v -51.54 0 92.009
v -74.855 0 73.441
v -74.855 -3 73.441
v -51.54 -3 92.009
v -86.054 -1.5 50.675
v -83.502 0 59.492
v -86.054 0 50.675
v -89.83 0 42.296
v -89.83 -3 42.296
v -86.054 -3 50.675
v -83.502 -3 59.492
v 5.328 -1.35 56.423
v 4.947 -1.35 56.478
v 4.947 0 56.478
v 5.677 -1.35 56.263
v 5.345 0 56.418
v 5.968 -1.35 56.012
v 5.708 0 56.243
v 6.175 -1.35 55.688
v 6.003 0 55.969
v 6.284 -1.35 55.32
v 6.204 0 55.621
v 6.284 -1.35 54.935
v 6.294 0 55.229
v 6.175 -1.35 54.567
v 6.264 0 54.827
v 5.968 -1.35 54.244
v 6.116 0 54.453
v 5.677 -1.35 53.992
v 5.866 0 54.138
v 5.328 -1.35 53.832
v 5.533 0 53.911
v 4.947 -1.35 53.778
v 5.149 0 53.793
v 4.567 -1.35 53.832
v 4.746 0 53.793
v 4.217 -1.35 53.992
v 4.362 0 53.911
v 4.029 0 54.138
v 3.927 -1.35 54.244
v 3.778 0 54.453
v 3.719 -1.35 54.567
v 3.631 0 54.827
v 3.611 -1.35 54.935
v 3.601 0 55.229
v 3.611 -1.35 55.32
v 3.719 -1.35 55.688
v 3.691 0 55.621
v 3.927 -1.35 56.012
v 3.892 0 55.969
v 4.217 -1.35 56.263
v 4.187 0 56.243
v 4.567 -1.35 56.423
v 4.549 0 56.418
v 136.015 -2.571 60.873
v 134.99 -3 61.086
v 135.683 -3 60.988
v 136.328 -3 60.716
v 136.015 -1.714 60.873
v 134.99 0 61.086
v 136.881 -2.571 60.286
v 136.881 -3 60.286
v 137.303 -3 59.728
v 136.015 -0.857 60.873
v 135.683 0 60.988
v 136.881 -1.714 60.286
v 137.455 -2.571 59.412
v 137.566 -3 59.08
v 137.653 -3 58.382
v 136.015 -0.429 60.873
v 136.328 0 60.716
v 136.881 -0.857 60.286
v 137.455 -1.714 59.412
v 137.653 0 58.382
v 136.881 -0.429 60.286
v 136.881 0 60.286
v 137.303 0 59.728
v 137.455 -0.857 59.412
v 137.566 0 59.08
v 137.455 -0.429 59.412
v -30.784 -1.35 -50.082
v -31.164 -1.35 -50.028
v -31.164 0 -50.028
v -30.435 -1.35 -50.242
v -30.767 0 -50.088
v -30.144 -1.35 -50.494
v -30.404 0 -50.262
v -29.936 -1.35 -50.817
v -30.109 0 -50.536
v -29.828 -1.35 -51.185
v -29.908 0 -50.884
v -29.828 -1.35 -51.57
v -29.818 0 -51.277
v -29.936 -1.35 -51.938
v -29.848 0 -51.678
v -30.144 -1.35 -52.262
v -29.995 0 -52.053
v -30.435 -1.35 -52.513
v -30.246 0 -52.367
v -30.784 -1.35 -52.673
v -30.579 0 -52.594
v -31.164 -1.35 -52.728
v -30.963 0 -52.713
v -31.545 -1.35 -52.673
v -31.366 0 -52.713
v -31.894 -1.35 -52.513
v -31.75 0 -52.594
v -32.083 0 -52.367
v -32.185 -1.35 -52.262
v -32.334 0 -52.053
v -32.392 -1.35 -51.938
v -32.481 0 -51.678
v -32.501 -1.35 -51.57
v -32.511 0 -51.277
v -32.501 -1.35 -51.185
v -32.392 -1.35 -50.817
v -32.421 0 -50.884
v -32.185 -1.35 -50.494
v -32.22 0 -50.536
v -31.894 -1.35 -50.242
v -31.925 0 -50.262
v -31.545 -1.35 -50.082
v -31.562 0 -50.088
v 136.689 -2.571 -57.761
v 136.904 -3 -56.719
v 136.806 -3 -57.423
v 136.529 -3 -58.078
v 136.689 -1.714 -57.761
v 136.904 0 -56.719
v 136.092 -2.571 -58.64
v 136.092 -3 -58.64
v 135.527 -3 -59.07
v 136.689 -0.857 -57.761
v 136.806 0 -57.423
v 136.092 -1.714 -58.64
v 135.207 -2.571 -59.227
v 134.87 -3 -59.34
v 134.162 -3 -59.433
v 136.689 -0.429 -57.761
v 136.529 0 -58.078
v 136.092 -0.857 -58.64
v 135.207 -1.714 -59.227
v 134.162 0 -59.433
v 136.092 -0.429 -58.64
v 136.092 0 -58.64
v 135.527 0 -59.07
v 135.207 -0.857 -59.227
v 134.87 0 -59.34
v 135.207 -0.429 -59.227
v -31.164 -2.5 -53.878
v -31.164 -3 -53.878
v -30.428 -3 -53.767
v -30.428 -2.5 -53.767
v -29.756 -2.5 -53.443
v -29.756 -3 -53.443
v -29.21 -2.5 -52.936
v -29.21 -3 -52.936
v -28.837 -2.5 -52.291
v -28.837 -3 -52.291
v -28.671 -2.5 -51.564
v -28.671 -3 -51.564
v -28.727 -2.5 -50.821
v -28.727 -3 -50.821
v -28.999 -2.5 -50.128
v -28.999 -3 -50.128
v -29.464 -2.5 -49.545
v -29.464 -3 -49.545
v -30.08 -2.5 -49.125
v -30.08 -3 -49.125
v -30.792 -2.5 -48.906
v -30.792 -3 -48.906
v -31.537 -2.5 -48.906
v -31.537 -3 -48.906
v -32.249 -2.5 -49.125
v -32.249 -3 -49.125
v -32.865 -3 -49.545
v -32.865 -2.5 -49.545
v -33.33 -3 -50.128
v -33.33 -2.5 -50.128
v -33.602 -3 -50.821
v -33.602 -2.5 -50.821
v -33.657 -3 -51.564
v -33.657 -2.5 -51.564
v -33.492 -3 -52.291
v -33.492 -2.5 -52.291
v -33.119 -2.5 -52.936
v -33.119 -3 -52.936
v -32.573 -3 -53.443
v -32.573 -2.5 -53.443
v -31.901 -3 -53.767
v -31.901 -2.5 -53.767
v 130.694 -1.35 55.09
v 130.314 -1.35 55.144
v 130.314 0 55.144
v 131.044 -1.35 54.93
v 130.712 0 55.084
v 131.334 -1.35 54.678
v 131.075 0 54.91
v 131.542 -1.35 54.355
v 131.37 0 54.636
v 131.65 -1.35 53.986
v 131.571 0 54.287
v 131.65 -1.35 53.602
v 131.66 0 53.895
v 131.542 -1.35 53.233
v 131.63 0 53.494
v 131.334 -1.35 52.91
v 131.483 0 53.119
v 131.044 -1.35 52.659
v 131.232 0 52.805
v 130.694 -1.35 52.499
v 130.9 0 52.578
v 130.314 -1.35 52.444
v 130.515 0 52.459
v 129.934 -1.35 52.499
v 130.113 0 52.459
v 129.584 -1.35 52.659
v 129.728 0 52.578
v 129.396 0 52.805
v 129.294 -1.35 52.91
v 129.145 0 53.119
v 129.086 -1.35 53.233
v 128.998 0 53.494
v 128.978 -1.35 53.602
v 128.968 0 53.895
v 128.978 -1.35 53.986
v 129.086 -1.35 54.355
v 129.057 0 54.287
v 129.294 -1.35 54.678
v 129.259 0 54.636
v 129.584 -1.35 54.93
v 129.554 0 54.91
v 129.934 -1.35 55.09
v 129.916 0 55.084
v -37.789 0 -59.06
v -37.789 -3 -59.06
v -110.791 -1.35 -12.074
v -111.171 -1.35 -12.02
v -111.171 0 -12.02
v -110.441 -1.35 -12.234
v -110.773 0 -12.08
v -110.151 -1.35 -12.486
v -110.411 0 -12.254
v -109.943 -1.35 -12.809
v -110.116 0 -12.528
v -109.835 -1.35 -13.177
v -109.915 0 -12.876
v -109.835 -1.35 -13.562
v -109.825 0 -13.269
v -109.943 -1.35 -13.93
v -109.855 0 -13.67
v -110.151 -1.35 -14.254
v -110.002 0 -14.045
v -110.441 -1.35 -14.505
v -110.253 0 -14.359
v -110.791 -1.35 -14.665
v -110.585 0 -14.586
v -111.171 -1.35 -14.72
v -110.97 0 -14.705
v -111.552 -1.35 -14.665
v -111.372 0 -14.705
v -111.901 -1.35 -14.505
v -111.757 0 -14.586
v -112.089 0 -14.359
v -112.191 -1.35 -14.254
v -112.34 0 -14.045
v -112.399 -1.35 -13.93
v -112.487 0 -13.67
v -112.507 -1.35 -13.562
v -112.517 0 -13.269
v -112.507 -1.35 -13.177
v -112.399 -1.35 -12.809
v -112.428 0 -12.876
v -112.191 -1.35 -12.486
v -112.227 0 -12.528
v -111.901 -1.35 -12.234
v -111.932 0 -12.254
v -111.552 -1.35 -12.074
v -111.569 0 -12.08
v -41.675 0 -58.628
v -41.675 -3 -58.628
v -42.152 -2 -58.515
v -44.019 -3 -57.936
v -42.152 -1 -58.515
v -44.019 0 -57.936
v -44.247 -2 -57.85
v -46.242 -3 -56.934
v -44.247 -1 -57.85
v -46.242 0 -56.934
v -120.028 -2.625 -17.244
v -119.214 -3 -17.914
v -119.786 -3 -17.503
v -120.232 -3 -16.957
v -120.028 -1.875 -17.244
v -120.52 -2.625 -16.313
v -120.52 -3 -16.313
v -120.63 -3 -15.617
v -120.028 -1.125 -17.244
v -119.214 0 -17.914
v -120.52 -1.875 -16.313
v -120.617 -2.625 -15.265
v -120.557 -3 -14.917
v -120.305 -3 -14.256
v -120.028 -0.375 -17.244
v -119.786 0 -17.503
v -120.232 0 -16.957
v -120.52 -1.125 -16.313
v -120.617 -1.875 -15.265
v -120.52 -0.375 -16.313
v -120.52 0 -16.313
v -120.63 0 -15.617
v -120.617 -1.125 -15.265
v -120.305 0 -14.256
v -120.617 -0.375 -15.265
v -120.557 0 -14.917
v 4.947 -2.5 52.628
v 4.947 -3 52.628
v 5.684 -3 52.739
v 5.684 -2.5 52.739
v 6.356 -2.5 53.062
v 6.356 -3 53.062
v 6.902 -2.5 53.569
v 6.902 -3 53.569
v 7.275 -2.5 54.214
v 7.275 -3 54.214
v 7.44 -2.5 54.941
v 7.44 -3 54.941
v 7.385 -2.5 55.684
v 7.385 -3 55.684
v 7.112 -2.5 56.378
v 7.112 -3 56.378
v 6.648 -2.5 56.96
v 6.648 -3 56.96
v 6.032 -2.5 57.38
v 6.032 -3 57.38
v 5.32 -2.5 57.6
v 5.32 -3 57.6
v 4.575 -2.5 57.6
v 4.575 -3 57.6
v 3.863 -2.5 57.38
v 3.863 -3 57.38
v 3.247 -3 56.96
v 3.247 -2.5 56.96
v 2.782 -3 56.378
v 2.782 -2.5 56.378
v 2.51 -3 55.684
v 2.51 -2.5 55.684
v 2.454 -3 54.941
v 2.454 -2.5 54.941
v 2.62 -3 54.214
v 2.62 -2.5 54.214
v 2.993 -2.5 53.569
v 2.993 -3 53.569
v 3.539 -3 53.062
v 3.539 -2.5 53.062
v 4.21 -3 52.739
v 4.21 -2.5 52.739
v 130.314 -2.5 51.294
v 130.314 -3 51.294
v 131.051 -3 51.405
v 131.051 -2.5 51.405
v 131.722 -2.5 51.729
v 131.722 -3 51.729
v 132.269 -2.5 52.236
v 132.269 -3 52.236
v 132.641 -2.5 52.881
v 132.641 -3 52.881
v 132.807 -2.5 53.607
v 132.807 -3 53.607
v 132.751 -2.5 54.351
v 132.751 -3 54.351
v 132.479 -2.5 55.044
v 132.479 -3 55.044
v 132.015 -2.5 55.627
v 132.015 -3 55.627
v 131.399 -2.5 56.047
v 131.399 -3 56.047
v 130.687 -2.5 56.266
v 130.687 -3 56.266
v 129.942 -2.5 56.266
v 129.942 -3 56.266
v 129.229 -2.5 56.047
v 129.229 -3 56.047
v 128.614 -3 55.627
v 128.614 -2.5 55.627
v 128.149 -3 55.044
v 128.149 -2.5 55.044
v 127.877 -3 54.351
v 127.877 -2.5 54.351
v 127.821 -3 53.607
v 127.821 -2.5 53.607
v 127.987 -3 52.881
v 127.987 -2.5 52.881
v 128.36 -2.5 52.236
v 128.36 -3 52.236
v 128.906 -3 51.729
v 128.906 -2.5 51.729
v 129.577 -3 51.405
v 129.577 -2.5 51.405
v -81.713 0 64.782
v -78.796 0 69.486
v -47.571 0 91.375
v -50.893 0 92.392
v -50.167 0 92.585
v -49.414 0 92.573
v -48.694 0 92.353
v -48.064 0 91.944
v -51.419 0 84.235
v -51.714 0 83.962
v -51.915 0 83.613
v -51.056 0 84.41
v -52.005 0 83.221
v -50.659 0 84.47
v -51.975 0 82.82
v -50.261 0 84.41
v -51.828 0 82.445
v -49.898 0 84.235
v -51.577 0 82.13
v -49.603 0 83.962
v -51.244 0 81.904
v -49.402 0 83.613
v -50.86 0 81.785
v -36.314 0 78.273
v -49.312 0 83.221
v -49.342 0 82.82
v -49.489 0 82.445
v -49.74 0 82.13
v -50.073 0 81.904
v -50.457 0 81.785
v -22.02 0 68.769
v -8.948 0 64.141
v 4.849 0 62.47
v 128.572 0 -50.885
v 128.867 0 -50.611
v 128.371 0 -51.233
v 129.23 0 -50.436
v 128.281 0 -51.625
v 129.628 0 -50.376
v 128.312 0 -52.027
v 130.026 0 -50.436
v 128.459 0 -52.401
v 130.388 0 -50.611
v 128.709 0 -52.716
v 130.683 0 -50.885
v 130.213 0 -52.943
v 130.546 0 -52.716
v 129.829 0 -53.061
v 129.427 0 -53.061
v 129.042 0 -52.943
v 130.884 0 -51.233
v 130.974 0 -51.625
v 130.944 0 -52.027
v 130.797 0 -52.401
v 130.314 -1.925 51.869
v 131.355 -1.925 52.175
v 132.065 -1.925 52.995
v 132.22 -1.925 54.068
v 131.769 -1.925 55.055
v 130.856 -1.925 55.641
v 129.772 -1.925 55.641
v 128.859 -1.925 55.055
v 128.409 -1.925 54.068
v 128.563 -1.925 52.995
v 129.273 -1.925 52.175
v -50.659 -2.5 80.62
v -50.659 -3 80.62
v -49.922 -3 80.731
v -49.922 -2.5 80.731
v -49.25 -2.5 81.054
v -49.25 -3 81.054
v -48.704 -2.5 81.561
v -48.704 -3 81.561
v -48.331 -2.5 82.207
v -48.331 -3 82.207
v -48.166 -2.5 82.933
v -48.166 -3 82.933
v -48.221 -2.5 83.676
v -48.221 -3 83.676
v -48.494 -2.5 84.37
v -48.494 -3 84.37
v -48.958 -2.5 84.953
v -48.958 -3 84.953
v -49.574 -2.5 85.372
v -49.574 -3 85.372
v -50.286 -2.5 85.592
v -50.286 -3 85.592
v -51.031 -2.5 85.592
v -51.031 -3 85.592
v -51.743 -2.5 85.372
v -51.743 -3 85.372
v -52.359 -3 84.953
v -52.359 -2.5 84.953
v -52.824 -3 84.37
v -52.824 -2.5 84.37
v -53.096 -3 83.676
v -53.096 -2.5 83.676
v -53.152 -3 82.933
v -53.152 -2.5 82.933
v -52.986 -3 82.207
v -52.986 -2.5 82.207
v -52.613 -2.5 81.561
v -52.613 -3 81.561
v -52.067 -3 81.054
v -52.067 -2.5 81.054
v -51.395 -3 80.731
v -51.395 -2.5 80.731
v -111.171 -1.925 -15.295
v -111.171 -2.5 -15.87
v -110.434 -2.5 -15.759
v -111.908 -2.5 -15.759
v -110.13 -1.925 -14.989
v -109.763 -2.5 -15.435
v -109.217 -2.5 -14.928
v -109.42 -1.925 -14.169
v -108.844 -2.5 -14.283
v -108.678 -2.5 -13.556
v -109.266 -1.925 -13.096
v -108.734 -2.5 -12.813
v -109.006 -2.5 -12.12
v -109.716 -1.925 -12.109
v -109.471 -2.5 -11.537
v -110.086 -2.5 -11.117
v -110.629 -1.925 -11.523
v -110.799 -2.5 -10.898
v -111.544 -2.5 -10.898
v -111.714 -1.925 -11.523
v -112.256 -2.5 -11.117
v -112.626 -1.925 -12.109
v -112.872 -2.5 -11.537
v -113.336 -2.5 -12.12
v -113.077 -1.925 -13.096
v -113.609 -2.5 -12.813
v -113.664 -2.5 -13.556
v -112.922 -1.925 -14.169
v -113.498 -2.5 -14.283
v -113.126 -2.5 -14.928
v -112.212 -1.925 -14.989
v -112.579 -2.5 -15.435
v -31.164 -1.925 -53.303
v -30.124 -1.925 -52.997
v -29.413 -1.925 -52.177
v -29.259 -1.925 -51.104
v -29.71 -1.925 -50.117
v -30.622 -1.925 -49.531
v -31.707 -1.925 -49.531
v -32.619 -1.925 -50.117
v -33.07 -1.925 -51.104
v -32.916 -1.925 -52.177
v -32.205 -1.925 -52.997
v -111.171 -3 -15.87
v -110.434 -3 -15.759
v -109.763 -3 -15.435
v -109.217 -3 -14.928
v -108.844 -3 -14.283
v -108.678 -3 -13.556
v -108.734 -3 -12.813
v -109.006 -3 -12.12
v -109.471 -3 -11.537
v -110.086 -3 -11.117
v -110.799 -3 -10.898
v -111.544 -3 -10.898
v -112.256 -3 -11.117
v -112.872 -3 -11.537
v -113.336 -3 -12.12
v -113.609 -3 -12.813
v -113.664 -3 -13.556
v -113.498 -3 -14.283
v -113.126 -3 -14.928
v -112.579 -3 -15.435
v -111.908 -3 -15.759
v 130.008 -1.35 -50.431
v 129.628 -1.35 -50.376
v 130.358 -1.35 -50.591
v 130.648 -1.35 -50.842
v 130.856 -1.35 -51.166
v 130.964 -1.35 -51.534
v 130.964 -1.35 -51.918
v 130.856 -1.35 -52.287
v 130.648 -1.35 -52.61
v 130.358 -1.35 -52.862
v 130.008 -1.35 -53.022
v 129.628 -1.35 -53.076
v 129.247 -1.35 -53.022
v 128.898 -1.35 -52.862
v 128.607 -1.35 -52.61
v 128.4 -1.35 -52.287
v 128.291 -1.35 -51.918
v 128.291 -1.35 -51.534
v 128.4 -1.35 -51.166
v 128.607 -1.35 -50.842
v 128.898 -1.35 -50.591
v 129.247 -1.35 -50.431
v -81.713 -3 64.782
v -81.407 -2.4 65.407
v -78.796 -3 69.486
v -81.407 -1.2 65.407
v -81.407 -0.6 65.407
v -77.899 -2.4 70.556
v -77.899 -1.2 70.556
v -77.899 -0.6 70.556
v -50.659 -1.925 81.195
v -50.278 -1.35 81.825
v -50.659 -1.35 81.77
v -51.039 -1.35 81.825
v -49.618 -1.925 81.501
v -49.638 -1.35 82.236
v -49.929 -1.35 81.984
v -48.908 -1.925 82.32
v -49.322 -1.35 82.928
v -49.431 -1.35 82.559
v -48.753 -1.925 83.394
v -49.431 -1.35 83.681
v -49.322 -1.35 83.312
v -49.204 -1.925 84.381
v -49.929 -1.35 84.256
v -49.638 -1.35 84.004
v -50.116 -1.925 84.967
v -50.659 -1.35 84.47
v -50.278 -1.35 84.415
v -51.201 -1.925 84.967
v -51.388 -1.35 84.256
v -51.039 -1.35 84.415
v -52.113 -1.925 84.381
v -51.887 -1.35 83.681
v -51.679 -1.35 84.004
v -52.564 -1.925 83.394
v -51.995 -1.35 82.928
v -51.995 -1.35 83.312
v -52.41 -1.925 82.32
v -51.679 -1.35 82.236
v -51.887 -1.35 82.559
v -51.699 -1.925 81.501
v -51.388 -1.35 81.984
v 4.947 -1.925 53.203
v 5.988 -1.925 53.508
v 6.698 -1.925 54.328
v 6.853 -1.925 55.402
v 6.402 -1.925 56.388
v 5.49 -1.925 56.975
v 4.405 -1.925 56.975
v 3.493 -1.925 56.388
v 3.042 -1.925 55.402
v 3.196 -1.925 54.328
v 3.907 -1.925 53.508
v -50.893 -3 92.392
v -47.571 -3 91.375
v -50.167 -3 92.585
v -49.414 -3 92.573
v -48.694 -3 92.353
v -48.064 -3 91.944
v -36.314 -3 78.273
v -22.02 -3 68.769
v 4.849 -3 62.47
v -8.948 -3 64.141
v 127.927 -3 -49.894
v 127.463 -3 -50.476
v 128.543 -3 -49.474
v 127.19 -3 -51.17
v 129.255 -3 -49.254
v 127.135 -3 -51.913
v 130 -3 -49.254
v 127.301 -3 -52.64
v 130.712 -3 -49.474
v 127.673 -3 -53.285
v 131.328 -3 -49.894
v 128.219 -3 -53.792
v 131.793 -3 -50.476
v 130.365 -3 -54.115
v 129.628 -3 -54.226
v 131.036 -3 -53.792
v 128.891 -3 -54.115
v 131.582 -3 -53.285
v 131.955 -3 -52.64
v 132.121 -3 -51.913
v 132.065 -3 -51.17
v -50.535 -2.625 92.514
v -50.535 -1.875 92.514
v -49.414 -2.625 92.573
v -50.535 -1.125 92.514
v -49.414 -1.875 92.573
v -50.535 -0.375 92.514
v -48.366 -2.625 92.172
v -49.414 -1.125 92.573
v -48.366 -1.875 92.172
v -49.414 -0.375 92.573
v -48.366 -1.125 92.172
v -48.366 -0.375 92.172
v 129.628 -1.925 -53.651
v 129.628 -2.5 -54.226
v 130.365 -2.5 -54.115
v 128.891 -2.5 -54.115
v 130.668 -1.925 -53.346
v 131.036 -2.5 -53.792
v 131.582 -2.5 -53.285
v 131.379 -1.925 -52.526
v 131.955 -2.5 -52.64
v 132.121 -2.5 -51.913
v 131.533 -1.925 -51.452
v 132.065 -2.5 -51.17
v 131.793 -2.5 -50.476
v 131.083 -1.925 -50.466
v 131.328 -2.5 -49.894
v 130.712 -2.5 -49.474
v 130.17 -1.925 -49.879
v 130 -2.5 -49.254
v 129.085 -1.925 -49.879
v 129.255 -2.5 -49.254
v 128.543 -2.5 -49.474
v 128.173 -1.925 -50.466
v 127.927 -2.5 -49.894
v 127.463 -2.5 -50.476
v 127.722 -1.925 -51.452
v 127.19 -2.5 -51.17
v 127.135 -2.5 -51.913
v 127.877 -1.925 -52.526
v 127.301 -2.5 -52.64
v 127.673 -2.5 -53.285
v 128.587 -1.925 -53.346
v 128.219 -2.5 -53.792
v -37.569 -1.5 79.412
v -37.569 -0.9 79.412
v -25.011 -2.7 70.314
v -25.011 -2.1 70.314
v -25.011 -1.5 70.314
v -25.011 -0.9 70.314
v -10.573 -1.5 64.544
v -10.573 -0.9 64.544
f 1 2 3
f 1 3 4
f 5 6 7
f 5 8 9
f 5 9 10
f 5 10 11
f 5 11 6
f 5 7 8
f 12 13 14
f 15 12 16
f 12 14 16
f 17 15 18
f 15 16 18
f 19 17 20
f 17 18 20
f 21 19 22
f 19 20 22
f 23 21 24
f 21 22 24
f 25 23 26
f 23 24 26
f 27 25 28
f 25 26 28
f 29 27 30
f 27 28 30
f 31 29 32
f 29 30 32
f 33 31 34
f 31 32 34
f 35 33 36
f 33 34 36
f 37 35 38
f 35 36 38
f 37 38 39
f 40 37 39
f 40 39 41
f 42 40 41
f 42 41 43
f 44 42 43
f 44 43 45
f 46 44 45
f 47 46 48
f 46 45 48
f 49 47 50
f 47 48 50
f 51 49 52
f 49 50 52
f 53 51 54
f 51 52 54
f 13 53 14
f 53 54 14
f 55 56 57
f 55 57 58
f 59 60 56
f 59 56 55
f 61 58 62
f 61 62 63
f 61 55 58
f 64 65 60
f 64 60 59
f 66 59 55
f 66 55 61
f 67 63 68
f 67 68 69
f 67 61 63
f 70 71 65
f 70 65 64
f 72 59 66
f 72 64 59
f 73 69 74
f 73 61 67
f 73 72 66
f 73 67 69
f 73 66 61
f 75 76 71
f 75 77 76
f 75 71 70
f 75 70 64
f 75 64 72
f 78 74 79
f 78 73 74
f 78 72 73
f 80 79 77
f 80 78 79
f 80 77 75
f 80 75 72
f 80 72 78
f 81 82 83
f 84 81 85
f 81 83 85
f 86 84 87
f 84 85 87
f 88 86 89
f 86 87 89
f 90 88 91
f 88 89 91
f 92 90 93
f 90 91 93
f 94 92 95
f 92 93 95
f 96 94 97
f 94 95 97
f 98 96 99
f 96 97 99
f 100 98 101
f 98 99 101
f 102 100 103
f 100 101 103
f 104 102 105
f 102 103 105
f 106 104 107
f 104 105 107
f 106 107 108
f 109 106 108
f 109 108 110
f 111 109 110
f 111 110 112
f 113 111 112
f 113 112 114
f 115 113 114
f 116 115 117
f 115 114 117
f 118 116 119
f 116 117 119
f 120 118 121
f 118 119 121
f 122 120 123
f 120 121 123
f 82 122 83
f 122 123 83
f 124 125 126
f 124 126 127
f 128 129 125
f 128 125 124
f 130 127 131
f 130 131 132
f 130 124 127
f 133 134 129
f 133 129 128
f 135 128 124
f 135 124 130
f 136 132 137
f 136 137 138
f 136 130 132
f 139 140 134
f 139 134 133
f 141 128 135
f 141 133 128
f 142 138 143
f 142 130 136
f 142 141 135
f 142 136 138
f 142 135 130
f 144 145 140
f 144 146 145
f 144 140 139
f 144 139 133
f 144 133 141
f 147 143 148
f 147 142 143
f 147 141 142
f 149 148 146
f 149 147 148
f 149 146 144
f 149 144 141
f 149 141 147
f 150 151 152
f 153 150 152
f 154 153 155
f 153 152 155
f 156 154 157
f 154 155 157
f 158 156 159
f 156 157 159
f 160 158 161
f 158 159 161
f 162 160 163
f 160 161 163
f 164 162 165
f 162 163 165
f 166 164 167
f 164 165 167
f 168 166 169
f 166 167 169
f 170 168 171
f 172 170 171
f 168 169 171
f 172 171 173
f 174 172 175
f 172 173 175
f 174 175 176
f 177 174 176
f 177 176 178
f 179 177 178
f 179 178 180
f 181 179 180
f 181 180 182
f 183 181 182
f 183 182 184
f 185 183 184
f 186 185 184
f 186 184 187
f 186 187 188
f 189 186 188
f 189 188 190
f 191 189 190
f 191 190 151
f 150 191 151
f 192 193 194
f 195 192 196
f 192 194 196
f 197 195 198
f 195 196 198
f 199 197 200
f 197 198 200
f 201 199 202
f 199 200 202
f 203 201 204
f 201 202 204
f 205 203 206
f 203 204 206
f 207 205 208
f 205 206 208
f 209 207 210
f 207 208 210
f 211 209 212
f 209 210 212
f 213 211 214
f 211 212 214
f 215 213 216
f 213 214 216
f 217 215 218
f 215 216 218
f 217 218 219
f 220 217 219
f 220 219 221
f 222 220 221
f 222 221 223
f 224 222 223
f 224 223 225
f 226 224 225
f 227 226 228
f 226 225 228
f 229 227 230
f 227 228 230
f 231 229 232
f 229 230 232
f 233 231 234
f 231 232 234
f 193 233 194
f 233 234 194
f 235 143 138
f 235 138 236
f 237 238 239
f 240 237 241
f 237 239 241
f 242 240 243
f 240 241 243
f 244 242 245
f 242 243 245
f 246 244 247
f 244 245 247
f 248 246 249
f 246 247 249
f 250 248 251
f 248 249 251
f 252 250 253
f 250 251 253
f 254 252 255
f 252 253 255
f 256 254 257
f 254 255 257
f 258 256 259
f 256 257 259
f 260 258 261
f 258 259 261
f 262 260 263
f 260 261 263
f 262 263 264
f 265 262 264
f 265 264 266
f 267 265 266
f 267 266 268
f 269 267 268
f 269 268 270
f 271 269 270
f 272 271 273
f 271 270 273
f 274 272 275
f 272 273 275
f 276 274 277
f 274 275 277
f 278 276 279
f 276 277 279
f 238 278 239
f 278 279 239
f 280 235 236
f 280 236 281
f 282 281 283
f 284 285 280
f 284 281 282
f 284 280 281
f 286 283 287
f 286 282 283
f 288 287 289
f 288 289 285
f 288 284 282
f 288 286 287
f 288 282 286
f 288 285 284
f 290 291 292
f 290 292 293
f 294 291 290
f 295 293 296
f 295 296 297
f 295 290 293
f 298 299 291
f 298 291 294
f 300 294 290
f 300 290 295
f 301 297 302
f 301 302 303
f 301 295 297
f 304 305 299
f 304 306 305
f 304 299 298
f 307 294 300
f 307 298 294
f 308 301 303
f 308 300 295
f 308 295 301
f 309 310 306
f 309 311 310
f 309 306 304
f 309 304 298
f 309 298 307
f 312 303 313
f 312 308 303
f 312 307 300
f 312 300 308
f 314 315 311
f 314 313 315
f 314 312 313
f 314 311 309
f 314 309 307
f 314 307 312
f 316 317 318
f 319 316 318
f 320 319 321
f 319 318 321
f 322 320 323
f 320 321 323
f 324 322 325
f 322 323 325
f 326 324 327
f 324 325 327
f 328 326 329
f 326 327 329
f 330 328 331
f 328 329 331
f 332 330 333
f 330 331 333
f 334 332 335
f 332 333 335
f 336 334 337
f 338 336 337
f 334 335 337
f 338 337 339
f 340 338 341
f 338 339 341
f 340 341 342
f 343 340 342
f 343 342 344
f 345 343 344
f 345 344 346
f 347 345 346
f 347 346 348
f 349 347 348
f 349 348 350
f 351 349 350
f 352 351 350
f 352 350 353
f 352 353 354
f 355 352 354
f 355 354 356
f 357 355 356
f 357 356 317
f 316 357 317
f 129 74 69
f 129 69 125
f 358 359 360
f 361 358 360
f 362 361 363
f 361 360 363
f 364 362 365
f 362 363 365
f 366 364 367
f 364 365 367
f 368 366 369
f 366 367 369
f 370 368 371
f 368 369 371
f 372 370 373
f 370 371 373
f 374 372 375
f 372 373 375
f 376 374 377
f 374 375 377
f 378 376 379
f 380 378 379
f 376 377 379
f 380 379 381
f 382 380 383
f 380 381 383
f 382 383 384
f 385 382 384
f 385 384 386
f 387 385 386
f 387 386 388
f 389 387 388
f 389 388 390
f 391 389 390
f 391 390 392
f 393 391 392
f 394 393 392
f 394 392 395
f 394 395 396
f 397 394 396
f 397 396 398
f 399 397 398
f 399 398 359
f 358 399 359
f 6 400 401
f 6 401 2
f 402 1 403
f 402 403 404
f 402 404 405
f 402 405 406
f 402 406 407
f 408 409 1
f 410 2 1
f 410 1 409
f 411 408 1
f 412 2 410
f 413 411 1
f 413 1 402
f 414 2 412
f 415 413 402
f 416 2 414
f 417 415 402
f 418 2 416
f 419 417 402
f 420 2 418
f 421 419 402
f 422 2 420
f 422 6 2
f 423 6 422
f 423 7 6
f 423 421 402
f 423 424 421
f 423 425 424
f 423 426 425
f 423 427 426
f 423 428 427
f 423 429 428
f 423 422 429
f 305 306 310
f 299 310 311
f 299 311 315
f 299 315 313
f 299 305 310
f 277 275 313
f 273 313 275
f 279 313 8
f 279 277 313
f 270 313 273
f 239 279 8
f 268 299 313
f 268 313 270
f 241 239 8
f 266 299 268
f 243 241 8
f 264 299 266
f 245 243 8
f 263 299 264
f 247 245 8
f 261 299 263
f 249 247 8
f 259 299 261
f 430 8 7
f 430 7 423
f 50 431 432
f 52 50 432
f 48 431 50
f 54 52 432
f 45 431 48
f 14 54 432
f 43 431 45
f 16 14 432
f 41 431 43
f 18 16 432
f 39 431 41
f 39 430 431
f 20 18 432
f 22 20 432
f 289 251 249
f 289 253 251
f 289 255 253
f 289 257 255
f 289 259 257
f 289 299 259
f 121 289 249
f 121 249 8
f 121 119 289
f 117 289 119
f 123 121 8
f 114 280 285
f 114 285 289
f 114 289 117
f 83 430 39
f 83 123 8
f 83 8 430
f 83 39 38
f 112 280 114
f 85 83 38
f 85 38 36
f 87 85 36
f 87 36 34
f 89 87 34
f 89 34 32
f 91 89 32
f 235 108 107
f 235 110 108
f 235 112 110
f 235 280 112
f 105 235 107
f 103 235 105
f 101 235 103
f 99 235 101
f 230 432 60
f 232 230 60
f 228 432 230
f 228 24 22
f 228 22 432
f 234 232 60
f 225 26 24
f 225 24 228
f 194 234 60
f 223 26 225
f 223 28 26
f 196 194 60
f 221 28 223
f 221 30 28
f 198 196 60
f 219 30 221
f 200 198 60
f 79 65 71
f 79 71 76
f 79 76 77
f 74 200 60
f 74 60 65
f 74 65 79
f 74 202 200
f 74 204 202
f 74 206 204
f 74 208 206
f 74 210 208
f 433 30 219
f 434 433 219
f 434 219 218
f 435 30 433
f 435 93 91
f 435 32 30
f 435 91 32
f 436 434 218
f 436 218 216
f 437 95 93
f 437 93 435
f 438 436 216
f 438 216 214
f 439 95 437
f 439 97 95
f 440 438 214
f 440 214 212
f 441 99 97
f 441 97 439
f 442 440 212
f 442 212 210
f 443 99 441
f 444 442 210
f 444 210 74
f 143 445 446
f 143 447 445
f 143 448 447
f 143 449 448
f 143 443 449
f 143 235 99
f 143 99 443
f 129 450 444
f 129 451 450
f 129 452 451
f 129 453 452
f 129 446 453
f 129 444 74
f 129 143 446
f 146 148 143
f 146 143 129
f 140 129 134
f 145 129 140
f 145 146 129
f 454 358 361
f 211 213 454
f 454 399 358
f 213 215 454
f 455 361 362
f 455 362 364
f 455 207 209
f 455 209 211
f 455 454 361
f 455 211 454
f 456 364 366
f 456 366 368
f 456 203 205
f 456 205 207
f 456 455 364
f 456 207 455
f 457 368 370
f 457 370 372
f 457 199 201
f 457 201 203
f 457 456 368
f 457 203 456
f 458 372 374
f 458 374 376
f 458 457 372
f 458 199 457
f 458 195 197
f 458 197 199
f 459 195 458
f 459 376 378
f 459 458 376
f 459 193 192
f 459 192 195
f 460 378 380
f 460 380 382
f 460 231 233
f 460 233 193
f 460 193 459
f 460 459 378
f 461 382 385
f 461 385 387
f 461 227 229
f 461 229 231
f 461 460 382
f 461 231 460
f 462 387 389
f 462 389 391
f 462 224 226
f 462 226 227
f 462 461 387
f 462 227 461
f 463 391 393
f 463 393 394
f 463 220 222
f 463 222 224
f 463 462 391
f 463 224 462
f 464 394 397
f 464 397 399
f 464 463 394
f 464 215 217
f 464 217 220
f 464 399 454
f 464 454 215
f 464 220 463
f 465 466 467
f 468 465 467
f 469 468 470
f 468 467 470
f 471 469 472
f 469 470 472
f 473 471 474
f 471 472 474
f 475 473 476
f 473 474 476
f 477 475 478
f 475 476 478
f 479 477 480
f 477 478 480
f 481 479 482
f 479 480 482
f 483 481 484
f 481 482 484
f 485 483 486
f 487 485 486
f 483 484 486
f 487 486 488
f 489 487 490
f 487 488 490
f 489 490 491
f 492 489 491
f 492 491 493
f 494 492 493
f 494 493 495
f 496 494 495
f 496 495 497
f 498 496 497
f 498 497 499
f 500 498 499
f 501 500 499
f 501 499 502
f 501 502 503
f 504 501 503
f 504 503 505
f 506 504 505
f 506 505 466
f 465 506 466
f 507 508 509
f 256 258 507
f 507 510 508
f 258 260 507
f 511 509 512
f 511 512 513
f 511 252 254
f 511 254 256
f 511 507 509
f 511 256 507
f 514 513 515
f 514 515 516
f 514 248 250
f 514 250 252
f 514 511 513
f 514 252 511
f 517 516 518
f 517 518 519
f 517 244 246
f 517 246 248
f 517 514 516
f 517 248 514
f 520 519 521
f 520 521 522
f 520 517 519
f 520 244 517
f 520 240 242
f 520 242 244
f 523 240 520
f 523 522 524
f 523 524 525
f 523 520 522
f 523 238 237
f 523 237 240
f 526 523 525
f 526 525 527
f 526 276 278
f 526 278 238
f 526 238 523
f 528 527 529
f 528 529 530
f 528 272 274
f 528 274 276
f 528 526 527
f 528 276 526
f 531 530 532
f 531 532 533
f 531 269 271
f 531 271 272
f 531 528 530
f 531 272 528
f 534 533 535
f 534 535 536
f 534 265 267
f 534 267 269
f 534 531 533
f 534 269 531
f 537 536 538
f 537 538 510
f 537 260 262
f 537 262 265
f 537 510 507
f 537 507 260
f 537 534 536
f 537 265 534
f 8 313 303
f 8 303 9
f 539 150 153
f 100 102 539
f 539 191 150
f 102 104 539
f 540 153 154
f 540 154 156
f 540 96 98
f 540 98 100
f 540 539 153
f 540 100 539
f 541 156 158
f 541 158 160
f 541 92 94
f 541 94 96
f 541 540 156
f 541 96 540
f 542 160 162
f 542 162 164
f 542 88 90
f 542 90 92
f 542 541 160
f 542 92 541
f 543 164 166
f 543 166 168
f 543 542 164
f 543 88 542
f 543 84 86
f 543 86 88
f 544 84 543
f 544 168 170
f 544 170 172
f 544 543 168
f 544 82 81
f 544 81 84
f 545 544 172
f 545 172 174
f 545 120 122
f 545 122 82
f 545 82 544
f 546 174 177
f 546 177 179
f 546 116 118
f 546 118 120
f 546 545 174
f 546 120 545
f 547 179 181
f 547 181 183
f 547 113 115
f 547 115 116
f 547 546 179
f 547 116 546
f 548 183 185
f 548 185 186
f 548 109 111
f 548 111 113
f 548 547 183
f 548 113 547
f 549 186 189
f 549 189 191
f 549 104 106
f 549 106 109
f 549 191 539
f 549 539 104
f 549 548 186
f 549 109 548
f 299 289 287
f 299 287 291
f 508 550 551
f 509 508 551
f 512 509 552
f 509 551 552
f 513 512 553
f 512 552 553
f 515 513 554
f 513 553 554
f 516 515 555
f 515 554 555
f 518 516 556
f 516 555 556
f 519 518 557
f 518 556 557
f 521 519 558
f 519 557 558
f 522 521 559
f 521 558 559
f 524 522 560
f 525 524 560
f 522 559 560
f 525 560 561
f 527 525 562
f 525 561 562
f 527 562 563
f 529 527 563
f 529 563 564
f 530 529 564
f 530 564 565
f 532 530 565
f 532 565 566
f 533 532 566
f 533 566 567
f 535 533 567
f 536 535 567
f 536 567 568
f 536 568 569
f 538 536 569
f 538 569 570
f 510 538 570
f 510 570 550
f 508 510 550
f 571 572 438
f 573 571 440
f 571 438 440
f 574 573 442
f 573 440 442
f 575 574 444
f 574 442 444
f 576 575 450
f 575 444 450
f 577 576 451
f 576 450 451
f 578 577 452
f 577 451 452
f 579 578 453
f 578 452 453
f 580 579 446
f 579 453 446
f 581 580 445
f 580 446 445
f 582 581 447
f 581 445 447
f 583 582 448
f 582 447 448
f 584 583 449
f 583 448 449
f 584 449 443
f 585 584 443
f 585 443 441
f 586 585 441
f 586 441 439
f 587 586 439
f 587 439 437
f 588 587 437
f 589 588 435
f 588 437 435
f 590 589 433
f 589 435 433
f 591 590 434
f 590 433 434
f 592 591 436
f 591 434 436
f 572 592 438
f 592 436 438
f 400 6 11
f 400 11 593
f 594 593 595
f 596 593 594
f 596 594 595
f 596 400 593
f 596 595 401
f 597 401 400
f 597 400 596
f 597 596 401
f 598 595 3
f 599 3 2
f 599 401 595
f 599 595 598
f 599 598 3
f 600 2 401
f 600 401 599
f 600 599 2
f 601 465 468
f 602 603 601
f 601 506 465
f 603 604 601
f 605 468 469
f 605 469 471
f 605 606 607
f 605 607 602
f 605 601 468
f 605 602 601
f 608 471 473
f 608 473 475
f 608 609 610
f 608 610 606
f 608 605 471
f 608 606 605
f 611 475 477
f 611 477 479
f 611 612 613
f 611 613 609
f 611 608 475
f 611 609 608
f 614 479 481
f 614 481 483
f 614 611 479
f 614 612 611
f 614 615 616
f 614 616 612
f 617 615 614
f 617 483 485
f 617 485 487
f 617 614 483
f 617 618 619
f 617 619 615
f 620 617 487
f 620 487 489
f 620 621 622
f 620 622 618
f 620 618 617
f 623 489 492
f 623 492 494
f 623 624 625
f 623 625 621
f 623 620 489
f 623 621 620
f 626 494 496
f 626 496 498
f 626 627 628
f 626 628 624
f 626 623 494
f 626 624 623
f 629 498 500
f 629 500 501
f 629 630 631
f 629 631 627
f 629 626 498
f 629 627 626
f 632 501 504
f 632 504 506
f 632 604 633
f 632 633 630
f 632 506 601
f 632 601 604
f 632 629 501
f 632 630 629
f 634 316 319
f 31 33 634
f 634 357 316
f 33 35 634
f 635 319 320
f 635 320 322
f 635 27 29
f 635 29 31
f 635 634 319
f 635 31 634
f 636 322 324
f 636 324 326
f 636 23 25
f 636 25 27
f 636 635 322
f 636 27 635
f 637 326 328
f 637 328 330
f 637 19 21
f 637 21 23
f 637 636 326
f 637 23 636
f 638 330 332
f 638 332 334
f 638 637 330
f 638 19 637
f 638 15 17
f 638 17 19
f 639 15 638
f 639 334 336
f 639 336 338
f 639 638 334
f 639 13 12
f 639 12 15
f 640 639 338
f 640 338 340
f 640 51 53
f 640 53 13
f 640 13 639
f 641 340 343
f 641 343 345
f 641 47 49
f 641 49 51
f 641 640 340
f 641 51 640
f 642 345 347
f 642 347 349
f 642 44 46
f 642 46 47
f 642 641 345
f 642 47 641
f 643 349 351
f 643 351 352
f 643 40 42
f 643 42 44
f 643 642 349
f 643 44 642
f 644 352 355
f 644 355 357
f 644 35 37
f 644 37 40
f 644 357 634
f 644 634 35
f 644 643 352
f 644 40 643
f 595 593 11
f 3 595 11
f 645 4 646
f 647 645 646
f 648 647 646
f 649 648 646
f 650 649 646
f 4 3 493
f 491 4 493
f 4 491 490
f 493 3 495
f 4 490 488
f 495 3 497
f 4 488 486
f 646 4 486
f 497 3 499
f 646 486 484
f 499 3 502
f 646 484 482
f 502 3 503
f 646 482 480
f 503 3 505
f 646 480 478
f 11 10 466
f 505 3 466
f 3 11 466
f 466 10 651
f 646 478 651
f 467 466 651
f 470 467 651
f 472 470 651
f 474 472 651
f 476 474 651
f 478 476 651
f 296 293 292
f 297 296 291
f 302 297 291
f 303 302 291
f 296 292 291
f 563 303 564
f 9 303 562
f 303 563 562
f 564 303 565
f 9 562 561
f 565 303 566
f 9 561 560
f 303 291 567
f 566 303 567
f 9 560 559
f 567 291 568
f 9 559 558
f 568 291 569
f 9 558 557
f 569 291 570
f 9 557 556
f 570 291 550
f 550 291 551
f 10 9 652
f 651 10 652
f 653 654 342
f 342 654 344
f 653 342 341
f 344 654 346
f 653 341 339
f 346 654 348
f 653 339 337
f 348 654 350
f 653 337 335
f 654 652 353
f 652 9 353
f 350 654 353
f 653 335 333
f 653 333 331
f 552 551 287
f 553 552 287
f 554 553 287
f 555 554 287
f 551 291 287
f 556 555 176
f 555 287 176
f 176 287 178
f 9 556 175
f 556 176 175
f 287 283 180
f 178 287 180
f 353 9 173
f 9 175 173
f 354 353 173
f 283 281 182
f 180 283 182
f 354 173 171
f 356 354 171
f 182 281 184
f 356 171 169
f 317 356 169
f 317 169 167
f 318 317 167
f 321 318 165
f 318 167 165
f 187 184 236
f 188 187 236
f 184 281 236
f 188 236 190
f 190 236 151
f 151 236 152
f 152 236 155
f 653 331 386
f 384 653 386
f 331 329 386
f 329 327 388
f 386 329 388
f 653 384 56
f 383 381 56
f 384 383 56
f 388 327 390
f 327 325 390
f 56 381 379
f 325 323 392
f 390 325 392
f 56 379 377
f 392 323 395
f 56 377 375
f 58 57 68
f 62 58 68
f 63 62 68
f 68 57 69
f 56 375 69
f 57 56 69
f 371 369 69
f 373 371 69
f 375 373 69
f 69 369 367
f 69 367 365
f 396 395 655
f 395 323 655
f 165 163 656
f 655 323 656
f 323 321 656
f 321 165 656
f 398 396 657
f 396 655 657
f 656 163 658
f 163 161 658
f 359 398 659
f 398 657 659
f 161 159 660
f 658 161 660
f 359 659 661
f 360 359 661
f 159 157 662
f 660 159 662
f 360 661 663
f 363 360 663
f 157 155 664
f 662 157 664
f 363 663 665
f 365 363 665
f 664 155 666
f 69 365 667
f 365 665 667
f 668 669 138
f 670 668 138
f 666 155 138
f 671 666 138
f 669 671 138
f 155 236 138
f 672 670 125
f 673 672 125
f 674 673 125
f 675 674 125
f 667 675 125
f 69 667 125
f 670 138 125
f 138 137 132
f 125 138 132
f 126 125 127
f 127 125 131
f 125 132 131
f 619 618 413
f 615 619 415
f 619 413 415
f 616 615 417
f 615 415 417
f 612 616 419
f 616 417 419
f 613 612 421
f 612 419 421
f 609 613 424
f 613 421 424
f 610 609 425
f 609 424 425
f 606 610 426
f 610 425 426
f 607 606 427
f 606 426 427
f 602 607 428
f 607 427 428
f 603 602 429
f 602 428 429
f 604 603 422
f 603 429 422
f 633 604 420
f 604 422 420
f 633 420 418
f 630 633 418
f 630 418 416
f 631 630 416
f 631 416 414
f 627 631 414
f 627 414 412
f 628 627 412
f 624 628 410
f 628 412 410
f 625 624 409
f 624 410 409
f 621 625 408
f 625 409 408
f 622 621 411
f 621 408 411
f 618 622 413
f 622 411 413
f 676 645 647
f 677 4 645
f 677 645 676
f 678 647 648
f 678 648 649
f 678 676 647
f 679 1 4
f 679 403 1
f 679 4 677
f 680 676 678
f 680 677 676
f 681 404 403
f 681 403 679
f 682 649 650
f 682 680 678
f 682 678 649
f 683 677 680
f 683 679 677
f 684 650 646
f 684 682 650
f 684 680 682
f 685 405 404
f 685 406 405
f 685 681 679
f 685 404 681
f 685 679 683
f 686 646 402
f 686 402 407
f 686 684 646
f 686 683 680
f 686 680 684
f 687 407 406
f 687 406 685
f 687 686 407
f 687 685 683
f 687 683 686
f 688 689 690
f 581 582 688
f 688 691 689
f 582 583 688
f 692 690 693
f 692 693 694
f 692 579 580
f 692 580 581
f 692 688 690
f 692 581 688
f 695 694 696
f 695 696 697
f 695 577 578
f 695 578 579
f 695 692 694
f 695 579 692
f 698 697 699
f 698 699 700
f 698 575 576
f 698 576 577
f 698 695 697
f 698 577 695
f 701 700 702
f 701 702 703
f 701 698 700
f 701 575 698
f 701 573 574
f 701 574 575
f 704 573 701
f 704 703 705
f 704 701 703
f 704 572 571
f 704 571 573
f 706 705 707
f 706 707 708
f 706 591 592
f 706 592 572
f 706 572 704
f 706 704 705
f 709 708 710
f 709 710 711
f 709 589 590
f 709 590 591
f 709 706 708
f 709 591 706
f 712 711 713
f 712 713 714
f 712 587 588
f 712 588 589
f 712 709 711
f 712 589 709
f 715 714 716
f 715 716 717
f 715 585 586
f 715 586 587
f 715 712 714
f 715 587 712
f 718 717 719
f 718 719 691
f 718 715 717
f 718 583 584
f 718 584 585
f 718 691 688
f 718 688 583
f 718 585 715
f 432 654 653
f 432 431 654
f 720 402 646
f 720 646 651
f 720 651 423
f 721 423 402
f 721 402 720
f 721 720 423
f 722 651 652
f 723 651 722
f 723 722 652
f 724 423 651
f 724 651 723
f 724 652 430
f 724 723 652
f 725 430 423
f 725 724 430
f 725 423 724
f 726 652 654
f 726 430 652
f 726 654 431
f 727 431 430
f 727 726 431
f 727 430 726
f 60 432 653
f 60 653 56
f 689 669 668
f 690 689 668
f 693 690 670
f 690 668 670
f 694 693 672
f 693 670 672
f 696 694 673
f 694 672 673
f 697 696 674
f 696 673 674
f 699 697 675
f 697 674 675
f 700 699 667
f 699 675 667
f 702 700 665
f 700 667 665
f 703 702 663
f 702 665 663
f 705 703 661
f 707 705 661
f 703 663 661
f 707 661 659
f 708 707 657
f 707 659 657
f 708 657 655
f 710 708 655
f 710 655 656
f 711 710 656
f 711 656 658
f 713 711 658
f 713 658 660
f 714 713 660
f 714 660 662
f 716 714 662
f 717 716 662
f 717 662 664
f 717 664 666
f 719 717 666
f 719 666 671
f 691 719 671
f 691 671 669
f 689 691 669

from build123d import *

# Parameters (mm, degrees)
SKETCH1_R           = 1.35
BOSS_EXTRUDE1_DEPTH = 3
SKETCH2_R           = 2.5
CUT_EXTRUDE1_DEPTH  = 1.7
CHAMFER1_SIZE       = 1.2


with BuildPart() as part:
    # Sketch1 → Boss-Extrude1 (new body)
    with BuildSketch(Plane(origin=(0, 0, 0), x_dir=(1, 0, 0), z_dir=(0, 1, 0))):
        with BuildLine():
            Line((134.161534911, 59.43281878), (-37.78892646, 59.059864213))
            add(Edge.make_bspline(
                [(-37.78892646, 59.059864213), (-39.260373987, 59.056672695), (-40.726264192, 58.873631016), (-42.864744181, 58.335544499), (-43.56477321, 58.113464931), (-44.928422176, 57.586554564), (-45.593707509, 57.281316649), (-46.242490458, 56.934388883)],
                knots=[0, 0, 0, 0, 0.5, 0.5, 0.75, 0.75, 1, 1, 1, 1], degree=3))
            Line((-46.242490458, 56.934388883), (-119.214433491, 17.913645156))
            add(Edge.make_bspline(
                [(-119.214433491, 17.913645156), (-119.371714153, 17.829541484), (-119.518068848, 17.731347507), (-119.789747392, 17.507837833), (-119.916274323, 17.380912308), (-120.139852202, 17.106706149), (-120.236961752, 16.960118582), (-120.402064762, 16.648131274), (-120.469932783, 16.481746722), (-120.570167022, 16.144162456), (-120.603591555, 15.971345529), (-120.63629684, 15.61747918), (-120.635015098, 15.439777034), (-120.598507798, 15.090011023), (-120.562994402, 14.91558609), (-120.458204018, 14.575953541), (-120.389758062, 14.412551149), (-120.305177563, 14.255596117)],
                knots=[0, 0, 0, 0, 0.125, 0.125, 0.25, 0.25, 0.375, 0.375, 0.5, 0.5, 0.625, 0.625, 0.75, 0.75, 0.875, 0.875, 1, 1, 1, 1], degree=3))
            Line((-120.305177563, 14.255596117), (-89.830246023, -42.296373733))
            add(Edge.make_bspline(
                [(-89.830246023, -42.296373733), (-88.375146858, -44.996584036), (-87.11307972, -47.796479497), (-84.994631409, -53.553509169), (-84.143686828, -56.492865486), (-83.501659246, -59.49224952)],
                knots=[0, 0, 0, 0, 0.5, 0.5, 1, 1, 1, 1], degree=3))
            add(Edge.make_bspline(
                [(-83.501659246, -59.49224952), (-83.207913745, -60.86455126), (-82.798283173, -62.200751268), (-82.010871212, -64.151167066), (-81.721235964, -64.787858992), (-81.092273153, -66.026650793), (-80.072714097, -67.836944856), (-78.830441112, -69.507100935), (-76.968111095, -71.604375976), (-75.952258591, -72.567256281), (-74.854523467, -73.441463587)],
                knots=[0, 0, 0, 0, 0.25, 0.25, 0.375, 0.375, 0.5, 0.75, 0.75, 1, 1, 1, 1], degree=3))
            Line((-74.854523467, -73.441463587), (-51.539950225, -92.008574916))
            add(Edge.make_bspline(
                [(-51.539950225, -92.008574916), (-51.390987712, -92.127204734), (-51.232429983, -92.228435853), (-50.896866499, -92.397446873), (-50.717603486, -92.465650862), (-50.353220614, -92.562423021), (-50.167823032, -92.591707222), (-49.790547653, -92.611667192), (-49.599550596, -92.601753163), (-49.228628709, -92.543472736), (-49.045331803, -92.494850179), (-48.690867071, -92.359239211), (-48.52347813, -92.273968718), (-48.207935535, -92.069298914), (-48.058689904, -91.948371285), (-47.792751324, -91.681532762), (-47.674455998, -91.534984666), (-47.571321486, -91.374872149)],
                knots=[0, 0, 0, 0, 0.125, 0.125, 0.25, 0.25, 0.375, 0.375, 0.5, 0.5, 0.625, 0.625, 0.75, 0.75, 0.875, 0.875, 1, 1, 1, 1], degree=3))
            add(Edge.make_bspline(
                [(-47.571321486, -91.374872149), (-46.153036919, -89.173037798), (-44.608917961, -87.076393648), (-41.274741201, -83.088695854), (-39.484564632, -81.197538353), (-35.653029438, -77.626010441), (-33.646571022, -75.978127616), (-29.459465947, -72.9471878), (-27.278793496, -71.564170023), (-23.876425351, -69.689354772), (-22.720413119, -69.097695924), (-20.363479447, -67.982655618), (-19.159804228, -67.458437514), (-15.529771039, -66.009292146), (-10.611085077, -64.391548948), (-5.539520445, -63.385094495), (-1.677546074, -62.863371081), (-0.379428844, -62.728223796), (2.232268288, -62.538422964), (3.539898616, -62.484137167), (4.849299501, -62.470210553)],
                knots=[0, 0, 0, 0, 0.125, 0.125, 0.25, 0.25, 0.375, 0.375, 0.5, 0.5, 0.5625, 0.5625, 0.625, 0.625, 0.75, 0.875, 0.875, 0.9375, 0.9375, 1, 1, 1, 1], degree=3))
            Line((4.849299501, -62.470210553), (134.990197336, -61.08604937))
            add(Edge.make_bspline(
                [(134.990197336, -61.08604937), (135.167346788, -61.084165224), (135.341361144, -61.064937541), (135.683502878, -60.993915065), (135.853395352, -60.941308848), (136.17721181, -60.80435926), (136.330630434, -60.720947254), (136.620639449, -60.524514457), (136.757918371, -60.410322016), (137.003647924, -60.161160095), (137.113655434, -60.025415528), (137.307455362, -59.731164559), (137.38973844, -59.574273341), (137.586799708, -59.088862557), (137.655136112, -58.736369262), (137.652832045, -58.382163441)],
                knots=[0, 0, 0, 0, 0.125, 0.125, 0.25, 0.25, 0.375, 0.375, 0.5, 0.5, 0.625, 0.625, 0.75, 0.75, 1, 1, 1, 1], degree=3))
            Line((137.652832045, -58.382163441), (136.904111112, 56.7188799))
            add(Edge.make_bspline(
                [(136.904111112, 56.7188799), (136.902940109, 56.898896811), (136.883766744, 57.075714075), (136.811945539, 57.42339902), (136.758448028, 57.596083274), (136.619240417, 57.924944469), (136.534418559, 58.080811621), (136.334727886, 58.375638017), (136.21883457, 58.51509664), (135.966139935, 58.765058133), (135.828467671, 58.877195989), (135.529967832, 59.07521276), (135.371179474, 59.159347789), (134.879114282, 59.361936915), (134.521405548, 59.433599309), (134.161534911, 59.43281878)],
                knots=[0, 0, 0, 0, 0.125, 0.125, 0.25, 0.25, 0.375, 0.375, 0.5, 0.5, 0.625, 0.625, 0.75, 0.75, 1, 1, 1, 1], degree=3))
        make_face()
        with Locations(Location((129.627717634, 51.726368816, 0), (0, 0, 270))):
            Circle(SKETCH1_R, mode=Mode.SUBTRACT)
        with Locations(Location((-31.164469896, 51.377616083, 0), (0, 0, 270))):
            Circle(SKETCH1_R, mode=Mode.SUBTRACT)
        with Locations(Location((-111.171184663, 13.369593003, 0), (0, 0, 270))):
            Circle(SKETCH1_R, mode=Mode.SUBTRACT)
        with Locations(Location((-50.65856493, -83.119927605, 0), (0, 0, 270))):
            Circle(SKETCH1_R, mode=Mode.SUBTRACT)
        with Locations(Location((4.947352904, -55.127624349, 0), (0, 0, 270))):
            Circle(SKETCH1_R, mode=Mode.SUBTRACT)
        with Locations(Location((130.314118933, -53.794240193, 0), (0, 0, 270))):
            Circle(SKETCH1_R, mode=Mode.SUBTRACT)
    extrude(amount=-BOSS_EXTRUDE1_DEPTH)

    # Sketch2 → Cut-Extrude1 (cut)
    with BuildSketch(Plane.XZ.offset(3)):
        with Locations(Location((-50.65856493, 83.119927605, 0), (0, 0, 270))):
            Circle(SKETCH2_R)
        with Locations(Location((4.947352904, 55.127624349, 0), (0, 0, 270))):
            Circle(SKETCH2_R)
        with Locations(Location((130.314118933, 53.794240193, 0), (0, 0, 270))):
            Circle(SKETCH2_R)
        with Locations(Location((129.627717634, -51.726368816, 0), (0, 0, 270))):
            Circle(SKETCH2_R)
        with Locations(Location((-31.164469896, -51.377616083, 0), (0, 0, 270))):
            Circle(SKETCH2_R)
        with Locations(Location((-111.171184663, -13.369593003, 0), (0, 0, 270))):
            Circle(SKETCH2_R)
    extrude(amount=-CUT_EXTRUDE1_DEPTH, mode=Mode.SUBTRACT)

    # Chamfer1
    # the kernel refuses this chamfer: 1.2 mm, written as the material it adds along each edge
    with BuildSketch(Plane(origin=(129.627717634, -1.3, -51.726368816), x_dir=(0, 0, -1), z_dir=(-1, 0, 0))) as chamfer1_piece_1_section:
        Polygon((2.5, CHAMFER1_SIZE), (2.5 - CHAMFER1_SIZE, 0), (2.5, 0), align=None)
    chamfer1_piece_1 = revolve(axis=Axis((129.627717634, -1.3, -51.726368816), (0, -1, 0)), mode=Mode.PRIVATE)
    chamfer1_piece_1 = chamfer1_piece_1 - Plane(origin=(129.627717634, -1.926520071, -51.726368816), x_dir=(0, 0, 1), z_dir=(0, 1, 0)) * Cylinder(1.35, 10, mode=Mode.PRIVATE)
    add(chamfer1_piece_1)
    with BuildSketch(Plane(origin=(130.314118933, -1.3, 53.794240193), x_dir=(0, 0, -1), z_dir=(-1, 0, 0))) as chamfer1_piece_2_section:
        Polygon((2.5, CHAMFER1_SIZE), (2.5 - CHAMFER1_SIZE, 0), (2.5, 0), align=None)
    chamfer1_piece_2 = revolve(axis=Axis((130.314118933, -1.3, 53.794240193), (0, -1, 0)), mode=Mode.PRIVATE)
    chamfer1_piece_2 = chamfer1_piece_2 - Plane(origin=(130.314118933, -1.926520071, 53.794240193), x_dir=(0, 0, 1), z_dir=(0, 1, 0)) * Cylinder(1.35, 10, mode=Mode.PRIVATE)
    add(chamfer1_piece_2)
    with BuildSketch(Plane(origin=(4.947352904, -1.3, 55.127624349), x_dir=(0, 0, -1), z_dir=(-1, 0, 0))) as chamfer1_piece_3_section:
        Polygon((2.5, CHAMFER1_SIZE), (2.5 - CHAMFER1_SIZE, 0), (2.5, 0), align=None)
    chamfer1_piece_3 = revolve(axis=Axis((4.947352904, -1.3, 55.127624349), (0, -1, 0)), mode=Mode.PRIVATE)
    chamfer1_piece_3 = chamfer1_piece_3 - Plane(origin=(4.947352904, -1.926520071, 55.127624349), x_dir=(0, 0, 1), z_dir=(0, 1, 0)) * Cylinder(1.35, 11, mode=Mode.PRIVATE)
    add(chamfer1_piece_3)
    with BuildSketch(Plane(origin=(-50.65856493, -1.3, 83.119927605), x_dir=(0, 0, -1), z_dir=(-1, 0, 0))) as chamfer1_piece_4_section:
        Polygon((2.5, CHAMFER1_SIZE), (2.5 - CHAMFER1_SIZE, 0), (2.5, 0), align=None)
    chamfer1_piece_4 = revolve(axis=Axis((-50.65856493, -1.3, 83.119927605), (0, -1, 0)), mode=Mode.PRIVATE)
    chamfer1_piece_4 = chamfer1_piece_4 - Plane(origin=(-50.65856493, -1.926520071, 83.119927605), x_dir=(0, 0, 1), z_dir=(0, 1, 0)) * Cylinder(1.35, 10, mode=Mode.PRIVATE)
    add(chamfer1_piece_4)
    with BuildSketch(Plane(origin=(-111.171184663, -1.3, -13.369593003), x_dir=(0, 0, -1), z_dir=(-1, 0, 0))) as chamfer1_piece_5_section:
        Polygon((2.5, CHAMFER1_SIZE), (2.5 - CHAMFER1_SIZE, 0), (2.5, 0), align=None)
    chamfer1_piece_5 = revolve(axis=Axis((-111.171184663, -1.3, -13.369593003), (0, -1, 0)), mode=Mode.PRIVATE)
    chamfer1_piece_5 = chamfer1_piece_5 - Plane(origin=(-111.171184663, -1.926520071, -13.369593003), x_dir=(0, 0, 1), z_dir=(0, 1, 0)) * Cylinder(1.35, 10, mode=Mode.PRIVATE)
    add(chamfer1_piece_5)
    with BuildSketch(Plane(origin=(-31.164469896, -1.3, -51.377616083), x_dir=(0, 0, -1), z_dir=(-1, 0, 0))) as chamfer1_piece_6_section:
        Polygon((2.5, CHAMFER1_SIZE), (2.5 - CHAMFER1_SIZE, 0), (2.5, 0), align=None)
    chamfer1_piece_6 = revolve(axis=Axis((-31.164469896, -1.3, -51.377616083), (0, -1, 0)), mode=Mode.PRIVATE)
    chamfer1_piece_6 = chamfer1_piece_6 - Plane(origin=(-31.164469896, -1.926520071, -51.377616083), x_dir=(0, 0, 1), z_dir=(0, 1, 0)) * Cylinder(1.35, 10, mode=Mode.PRIVATE)
    add(chamfer1_piece_6)


solid = part.part
